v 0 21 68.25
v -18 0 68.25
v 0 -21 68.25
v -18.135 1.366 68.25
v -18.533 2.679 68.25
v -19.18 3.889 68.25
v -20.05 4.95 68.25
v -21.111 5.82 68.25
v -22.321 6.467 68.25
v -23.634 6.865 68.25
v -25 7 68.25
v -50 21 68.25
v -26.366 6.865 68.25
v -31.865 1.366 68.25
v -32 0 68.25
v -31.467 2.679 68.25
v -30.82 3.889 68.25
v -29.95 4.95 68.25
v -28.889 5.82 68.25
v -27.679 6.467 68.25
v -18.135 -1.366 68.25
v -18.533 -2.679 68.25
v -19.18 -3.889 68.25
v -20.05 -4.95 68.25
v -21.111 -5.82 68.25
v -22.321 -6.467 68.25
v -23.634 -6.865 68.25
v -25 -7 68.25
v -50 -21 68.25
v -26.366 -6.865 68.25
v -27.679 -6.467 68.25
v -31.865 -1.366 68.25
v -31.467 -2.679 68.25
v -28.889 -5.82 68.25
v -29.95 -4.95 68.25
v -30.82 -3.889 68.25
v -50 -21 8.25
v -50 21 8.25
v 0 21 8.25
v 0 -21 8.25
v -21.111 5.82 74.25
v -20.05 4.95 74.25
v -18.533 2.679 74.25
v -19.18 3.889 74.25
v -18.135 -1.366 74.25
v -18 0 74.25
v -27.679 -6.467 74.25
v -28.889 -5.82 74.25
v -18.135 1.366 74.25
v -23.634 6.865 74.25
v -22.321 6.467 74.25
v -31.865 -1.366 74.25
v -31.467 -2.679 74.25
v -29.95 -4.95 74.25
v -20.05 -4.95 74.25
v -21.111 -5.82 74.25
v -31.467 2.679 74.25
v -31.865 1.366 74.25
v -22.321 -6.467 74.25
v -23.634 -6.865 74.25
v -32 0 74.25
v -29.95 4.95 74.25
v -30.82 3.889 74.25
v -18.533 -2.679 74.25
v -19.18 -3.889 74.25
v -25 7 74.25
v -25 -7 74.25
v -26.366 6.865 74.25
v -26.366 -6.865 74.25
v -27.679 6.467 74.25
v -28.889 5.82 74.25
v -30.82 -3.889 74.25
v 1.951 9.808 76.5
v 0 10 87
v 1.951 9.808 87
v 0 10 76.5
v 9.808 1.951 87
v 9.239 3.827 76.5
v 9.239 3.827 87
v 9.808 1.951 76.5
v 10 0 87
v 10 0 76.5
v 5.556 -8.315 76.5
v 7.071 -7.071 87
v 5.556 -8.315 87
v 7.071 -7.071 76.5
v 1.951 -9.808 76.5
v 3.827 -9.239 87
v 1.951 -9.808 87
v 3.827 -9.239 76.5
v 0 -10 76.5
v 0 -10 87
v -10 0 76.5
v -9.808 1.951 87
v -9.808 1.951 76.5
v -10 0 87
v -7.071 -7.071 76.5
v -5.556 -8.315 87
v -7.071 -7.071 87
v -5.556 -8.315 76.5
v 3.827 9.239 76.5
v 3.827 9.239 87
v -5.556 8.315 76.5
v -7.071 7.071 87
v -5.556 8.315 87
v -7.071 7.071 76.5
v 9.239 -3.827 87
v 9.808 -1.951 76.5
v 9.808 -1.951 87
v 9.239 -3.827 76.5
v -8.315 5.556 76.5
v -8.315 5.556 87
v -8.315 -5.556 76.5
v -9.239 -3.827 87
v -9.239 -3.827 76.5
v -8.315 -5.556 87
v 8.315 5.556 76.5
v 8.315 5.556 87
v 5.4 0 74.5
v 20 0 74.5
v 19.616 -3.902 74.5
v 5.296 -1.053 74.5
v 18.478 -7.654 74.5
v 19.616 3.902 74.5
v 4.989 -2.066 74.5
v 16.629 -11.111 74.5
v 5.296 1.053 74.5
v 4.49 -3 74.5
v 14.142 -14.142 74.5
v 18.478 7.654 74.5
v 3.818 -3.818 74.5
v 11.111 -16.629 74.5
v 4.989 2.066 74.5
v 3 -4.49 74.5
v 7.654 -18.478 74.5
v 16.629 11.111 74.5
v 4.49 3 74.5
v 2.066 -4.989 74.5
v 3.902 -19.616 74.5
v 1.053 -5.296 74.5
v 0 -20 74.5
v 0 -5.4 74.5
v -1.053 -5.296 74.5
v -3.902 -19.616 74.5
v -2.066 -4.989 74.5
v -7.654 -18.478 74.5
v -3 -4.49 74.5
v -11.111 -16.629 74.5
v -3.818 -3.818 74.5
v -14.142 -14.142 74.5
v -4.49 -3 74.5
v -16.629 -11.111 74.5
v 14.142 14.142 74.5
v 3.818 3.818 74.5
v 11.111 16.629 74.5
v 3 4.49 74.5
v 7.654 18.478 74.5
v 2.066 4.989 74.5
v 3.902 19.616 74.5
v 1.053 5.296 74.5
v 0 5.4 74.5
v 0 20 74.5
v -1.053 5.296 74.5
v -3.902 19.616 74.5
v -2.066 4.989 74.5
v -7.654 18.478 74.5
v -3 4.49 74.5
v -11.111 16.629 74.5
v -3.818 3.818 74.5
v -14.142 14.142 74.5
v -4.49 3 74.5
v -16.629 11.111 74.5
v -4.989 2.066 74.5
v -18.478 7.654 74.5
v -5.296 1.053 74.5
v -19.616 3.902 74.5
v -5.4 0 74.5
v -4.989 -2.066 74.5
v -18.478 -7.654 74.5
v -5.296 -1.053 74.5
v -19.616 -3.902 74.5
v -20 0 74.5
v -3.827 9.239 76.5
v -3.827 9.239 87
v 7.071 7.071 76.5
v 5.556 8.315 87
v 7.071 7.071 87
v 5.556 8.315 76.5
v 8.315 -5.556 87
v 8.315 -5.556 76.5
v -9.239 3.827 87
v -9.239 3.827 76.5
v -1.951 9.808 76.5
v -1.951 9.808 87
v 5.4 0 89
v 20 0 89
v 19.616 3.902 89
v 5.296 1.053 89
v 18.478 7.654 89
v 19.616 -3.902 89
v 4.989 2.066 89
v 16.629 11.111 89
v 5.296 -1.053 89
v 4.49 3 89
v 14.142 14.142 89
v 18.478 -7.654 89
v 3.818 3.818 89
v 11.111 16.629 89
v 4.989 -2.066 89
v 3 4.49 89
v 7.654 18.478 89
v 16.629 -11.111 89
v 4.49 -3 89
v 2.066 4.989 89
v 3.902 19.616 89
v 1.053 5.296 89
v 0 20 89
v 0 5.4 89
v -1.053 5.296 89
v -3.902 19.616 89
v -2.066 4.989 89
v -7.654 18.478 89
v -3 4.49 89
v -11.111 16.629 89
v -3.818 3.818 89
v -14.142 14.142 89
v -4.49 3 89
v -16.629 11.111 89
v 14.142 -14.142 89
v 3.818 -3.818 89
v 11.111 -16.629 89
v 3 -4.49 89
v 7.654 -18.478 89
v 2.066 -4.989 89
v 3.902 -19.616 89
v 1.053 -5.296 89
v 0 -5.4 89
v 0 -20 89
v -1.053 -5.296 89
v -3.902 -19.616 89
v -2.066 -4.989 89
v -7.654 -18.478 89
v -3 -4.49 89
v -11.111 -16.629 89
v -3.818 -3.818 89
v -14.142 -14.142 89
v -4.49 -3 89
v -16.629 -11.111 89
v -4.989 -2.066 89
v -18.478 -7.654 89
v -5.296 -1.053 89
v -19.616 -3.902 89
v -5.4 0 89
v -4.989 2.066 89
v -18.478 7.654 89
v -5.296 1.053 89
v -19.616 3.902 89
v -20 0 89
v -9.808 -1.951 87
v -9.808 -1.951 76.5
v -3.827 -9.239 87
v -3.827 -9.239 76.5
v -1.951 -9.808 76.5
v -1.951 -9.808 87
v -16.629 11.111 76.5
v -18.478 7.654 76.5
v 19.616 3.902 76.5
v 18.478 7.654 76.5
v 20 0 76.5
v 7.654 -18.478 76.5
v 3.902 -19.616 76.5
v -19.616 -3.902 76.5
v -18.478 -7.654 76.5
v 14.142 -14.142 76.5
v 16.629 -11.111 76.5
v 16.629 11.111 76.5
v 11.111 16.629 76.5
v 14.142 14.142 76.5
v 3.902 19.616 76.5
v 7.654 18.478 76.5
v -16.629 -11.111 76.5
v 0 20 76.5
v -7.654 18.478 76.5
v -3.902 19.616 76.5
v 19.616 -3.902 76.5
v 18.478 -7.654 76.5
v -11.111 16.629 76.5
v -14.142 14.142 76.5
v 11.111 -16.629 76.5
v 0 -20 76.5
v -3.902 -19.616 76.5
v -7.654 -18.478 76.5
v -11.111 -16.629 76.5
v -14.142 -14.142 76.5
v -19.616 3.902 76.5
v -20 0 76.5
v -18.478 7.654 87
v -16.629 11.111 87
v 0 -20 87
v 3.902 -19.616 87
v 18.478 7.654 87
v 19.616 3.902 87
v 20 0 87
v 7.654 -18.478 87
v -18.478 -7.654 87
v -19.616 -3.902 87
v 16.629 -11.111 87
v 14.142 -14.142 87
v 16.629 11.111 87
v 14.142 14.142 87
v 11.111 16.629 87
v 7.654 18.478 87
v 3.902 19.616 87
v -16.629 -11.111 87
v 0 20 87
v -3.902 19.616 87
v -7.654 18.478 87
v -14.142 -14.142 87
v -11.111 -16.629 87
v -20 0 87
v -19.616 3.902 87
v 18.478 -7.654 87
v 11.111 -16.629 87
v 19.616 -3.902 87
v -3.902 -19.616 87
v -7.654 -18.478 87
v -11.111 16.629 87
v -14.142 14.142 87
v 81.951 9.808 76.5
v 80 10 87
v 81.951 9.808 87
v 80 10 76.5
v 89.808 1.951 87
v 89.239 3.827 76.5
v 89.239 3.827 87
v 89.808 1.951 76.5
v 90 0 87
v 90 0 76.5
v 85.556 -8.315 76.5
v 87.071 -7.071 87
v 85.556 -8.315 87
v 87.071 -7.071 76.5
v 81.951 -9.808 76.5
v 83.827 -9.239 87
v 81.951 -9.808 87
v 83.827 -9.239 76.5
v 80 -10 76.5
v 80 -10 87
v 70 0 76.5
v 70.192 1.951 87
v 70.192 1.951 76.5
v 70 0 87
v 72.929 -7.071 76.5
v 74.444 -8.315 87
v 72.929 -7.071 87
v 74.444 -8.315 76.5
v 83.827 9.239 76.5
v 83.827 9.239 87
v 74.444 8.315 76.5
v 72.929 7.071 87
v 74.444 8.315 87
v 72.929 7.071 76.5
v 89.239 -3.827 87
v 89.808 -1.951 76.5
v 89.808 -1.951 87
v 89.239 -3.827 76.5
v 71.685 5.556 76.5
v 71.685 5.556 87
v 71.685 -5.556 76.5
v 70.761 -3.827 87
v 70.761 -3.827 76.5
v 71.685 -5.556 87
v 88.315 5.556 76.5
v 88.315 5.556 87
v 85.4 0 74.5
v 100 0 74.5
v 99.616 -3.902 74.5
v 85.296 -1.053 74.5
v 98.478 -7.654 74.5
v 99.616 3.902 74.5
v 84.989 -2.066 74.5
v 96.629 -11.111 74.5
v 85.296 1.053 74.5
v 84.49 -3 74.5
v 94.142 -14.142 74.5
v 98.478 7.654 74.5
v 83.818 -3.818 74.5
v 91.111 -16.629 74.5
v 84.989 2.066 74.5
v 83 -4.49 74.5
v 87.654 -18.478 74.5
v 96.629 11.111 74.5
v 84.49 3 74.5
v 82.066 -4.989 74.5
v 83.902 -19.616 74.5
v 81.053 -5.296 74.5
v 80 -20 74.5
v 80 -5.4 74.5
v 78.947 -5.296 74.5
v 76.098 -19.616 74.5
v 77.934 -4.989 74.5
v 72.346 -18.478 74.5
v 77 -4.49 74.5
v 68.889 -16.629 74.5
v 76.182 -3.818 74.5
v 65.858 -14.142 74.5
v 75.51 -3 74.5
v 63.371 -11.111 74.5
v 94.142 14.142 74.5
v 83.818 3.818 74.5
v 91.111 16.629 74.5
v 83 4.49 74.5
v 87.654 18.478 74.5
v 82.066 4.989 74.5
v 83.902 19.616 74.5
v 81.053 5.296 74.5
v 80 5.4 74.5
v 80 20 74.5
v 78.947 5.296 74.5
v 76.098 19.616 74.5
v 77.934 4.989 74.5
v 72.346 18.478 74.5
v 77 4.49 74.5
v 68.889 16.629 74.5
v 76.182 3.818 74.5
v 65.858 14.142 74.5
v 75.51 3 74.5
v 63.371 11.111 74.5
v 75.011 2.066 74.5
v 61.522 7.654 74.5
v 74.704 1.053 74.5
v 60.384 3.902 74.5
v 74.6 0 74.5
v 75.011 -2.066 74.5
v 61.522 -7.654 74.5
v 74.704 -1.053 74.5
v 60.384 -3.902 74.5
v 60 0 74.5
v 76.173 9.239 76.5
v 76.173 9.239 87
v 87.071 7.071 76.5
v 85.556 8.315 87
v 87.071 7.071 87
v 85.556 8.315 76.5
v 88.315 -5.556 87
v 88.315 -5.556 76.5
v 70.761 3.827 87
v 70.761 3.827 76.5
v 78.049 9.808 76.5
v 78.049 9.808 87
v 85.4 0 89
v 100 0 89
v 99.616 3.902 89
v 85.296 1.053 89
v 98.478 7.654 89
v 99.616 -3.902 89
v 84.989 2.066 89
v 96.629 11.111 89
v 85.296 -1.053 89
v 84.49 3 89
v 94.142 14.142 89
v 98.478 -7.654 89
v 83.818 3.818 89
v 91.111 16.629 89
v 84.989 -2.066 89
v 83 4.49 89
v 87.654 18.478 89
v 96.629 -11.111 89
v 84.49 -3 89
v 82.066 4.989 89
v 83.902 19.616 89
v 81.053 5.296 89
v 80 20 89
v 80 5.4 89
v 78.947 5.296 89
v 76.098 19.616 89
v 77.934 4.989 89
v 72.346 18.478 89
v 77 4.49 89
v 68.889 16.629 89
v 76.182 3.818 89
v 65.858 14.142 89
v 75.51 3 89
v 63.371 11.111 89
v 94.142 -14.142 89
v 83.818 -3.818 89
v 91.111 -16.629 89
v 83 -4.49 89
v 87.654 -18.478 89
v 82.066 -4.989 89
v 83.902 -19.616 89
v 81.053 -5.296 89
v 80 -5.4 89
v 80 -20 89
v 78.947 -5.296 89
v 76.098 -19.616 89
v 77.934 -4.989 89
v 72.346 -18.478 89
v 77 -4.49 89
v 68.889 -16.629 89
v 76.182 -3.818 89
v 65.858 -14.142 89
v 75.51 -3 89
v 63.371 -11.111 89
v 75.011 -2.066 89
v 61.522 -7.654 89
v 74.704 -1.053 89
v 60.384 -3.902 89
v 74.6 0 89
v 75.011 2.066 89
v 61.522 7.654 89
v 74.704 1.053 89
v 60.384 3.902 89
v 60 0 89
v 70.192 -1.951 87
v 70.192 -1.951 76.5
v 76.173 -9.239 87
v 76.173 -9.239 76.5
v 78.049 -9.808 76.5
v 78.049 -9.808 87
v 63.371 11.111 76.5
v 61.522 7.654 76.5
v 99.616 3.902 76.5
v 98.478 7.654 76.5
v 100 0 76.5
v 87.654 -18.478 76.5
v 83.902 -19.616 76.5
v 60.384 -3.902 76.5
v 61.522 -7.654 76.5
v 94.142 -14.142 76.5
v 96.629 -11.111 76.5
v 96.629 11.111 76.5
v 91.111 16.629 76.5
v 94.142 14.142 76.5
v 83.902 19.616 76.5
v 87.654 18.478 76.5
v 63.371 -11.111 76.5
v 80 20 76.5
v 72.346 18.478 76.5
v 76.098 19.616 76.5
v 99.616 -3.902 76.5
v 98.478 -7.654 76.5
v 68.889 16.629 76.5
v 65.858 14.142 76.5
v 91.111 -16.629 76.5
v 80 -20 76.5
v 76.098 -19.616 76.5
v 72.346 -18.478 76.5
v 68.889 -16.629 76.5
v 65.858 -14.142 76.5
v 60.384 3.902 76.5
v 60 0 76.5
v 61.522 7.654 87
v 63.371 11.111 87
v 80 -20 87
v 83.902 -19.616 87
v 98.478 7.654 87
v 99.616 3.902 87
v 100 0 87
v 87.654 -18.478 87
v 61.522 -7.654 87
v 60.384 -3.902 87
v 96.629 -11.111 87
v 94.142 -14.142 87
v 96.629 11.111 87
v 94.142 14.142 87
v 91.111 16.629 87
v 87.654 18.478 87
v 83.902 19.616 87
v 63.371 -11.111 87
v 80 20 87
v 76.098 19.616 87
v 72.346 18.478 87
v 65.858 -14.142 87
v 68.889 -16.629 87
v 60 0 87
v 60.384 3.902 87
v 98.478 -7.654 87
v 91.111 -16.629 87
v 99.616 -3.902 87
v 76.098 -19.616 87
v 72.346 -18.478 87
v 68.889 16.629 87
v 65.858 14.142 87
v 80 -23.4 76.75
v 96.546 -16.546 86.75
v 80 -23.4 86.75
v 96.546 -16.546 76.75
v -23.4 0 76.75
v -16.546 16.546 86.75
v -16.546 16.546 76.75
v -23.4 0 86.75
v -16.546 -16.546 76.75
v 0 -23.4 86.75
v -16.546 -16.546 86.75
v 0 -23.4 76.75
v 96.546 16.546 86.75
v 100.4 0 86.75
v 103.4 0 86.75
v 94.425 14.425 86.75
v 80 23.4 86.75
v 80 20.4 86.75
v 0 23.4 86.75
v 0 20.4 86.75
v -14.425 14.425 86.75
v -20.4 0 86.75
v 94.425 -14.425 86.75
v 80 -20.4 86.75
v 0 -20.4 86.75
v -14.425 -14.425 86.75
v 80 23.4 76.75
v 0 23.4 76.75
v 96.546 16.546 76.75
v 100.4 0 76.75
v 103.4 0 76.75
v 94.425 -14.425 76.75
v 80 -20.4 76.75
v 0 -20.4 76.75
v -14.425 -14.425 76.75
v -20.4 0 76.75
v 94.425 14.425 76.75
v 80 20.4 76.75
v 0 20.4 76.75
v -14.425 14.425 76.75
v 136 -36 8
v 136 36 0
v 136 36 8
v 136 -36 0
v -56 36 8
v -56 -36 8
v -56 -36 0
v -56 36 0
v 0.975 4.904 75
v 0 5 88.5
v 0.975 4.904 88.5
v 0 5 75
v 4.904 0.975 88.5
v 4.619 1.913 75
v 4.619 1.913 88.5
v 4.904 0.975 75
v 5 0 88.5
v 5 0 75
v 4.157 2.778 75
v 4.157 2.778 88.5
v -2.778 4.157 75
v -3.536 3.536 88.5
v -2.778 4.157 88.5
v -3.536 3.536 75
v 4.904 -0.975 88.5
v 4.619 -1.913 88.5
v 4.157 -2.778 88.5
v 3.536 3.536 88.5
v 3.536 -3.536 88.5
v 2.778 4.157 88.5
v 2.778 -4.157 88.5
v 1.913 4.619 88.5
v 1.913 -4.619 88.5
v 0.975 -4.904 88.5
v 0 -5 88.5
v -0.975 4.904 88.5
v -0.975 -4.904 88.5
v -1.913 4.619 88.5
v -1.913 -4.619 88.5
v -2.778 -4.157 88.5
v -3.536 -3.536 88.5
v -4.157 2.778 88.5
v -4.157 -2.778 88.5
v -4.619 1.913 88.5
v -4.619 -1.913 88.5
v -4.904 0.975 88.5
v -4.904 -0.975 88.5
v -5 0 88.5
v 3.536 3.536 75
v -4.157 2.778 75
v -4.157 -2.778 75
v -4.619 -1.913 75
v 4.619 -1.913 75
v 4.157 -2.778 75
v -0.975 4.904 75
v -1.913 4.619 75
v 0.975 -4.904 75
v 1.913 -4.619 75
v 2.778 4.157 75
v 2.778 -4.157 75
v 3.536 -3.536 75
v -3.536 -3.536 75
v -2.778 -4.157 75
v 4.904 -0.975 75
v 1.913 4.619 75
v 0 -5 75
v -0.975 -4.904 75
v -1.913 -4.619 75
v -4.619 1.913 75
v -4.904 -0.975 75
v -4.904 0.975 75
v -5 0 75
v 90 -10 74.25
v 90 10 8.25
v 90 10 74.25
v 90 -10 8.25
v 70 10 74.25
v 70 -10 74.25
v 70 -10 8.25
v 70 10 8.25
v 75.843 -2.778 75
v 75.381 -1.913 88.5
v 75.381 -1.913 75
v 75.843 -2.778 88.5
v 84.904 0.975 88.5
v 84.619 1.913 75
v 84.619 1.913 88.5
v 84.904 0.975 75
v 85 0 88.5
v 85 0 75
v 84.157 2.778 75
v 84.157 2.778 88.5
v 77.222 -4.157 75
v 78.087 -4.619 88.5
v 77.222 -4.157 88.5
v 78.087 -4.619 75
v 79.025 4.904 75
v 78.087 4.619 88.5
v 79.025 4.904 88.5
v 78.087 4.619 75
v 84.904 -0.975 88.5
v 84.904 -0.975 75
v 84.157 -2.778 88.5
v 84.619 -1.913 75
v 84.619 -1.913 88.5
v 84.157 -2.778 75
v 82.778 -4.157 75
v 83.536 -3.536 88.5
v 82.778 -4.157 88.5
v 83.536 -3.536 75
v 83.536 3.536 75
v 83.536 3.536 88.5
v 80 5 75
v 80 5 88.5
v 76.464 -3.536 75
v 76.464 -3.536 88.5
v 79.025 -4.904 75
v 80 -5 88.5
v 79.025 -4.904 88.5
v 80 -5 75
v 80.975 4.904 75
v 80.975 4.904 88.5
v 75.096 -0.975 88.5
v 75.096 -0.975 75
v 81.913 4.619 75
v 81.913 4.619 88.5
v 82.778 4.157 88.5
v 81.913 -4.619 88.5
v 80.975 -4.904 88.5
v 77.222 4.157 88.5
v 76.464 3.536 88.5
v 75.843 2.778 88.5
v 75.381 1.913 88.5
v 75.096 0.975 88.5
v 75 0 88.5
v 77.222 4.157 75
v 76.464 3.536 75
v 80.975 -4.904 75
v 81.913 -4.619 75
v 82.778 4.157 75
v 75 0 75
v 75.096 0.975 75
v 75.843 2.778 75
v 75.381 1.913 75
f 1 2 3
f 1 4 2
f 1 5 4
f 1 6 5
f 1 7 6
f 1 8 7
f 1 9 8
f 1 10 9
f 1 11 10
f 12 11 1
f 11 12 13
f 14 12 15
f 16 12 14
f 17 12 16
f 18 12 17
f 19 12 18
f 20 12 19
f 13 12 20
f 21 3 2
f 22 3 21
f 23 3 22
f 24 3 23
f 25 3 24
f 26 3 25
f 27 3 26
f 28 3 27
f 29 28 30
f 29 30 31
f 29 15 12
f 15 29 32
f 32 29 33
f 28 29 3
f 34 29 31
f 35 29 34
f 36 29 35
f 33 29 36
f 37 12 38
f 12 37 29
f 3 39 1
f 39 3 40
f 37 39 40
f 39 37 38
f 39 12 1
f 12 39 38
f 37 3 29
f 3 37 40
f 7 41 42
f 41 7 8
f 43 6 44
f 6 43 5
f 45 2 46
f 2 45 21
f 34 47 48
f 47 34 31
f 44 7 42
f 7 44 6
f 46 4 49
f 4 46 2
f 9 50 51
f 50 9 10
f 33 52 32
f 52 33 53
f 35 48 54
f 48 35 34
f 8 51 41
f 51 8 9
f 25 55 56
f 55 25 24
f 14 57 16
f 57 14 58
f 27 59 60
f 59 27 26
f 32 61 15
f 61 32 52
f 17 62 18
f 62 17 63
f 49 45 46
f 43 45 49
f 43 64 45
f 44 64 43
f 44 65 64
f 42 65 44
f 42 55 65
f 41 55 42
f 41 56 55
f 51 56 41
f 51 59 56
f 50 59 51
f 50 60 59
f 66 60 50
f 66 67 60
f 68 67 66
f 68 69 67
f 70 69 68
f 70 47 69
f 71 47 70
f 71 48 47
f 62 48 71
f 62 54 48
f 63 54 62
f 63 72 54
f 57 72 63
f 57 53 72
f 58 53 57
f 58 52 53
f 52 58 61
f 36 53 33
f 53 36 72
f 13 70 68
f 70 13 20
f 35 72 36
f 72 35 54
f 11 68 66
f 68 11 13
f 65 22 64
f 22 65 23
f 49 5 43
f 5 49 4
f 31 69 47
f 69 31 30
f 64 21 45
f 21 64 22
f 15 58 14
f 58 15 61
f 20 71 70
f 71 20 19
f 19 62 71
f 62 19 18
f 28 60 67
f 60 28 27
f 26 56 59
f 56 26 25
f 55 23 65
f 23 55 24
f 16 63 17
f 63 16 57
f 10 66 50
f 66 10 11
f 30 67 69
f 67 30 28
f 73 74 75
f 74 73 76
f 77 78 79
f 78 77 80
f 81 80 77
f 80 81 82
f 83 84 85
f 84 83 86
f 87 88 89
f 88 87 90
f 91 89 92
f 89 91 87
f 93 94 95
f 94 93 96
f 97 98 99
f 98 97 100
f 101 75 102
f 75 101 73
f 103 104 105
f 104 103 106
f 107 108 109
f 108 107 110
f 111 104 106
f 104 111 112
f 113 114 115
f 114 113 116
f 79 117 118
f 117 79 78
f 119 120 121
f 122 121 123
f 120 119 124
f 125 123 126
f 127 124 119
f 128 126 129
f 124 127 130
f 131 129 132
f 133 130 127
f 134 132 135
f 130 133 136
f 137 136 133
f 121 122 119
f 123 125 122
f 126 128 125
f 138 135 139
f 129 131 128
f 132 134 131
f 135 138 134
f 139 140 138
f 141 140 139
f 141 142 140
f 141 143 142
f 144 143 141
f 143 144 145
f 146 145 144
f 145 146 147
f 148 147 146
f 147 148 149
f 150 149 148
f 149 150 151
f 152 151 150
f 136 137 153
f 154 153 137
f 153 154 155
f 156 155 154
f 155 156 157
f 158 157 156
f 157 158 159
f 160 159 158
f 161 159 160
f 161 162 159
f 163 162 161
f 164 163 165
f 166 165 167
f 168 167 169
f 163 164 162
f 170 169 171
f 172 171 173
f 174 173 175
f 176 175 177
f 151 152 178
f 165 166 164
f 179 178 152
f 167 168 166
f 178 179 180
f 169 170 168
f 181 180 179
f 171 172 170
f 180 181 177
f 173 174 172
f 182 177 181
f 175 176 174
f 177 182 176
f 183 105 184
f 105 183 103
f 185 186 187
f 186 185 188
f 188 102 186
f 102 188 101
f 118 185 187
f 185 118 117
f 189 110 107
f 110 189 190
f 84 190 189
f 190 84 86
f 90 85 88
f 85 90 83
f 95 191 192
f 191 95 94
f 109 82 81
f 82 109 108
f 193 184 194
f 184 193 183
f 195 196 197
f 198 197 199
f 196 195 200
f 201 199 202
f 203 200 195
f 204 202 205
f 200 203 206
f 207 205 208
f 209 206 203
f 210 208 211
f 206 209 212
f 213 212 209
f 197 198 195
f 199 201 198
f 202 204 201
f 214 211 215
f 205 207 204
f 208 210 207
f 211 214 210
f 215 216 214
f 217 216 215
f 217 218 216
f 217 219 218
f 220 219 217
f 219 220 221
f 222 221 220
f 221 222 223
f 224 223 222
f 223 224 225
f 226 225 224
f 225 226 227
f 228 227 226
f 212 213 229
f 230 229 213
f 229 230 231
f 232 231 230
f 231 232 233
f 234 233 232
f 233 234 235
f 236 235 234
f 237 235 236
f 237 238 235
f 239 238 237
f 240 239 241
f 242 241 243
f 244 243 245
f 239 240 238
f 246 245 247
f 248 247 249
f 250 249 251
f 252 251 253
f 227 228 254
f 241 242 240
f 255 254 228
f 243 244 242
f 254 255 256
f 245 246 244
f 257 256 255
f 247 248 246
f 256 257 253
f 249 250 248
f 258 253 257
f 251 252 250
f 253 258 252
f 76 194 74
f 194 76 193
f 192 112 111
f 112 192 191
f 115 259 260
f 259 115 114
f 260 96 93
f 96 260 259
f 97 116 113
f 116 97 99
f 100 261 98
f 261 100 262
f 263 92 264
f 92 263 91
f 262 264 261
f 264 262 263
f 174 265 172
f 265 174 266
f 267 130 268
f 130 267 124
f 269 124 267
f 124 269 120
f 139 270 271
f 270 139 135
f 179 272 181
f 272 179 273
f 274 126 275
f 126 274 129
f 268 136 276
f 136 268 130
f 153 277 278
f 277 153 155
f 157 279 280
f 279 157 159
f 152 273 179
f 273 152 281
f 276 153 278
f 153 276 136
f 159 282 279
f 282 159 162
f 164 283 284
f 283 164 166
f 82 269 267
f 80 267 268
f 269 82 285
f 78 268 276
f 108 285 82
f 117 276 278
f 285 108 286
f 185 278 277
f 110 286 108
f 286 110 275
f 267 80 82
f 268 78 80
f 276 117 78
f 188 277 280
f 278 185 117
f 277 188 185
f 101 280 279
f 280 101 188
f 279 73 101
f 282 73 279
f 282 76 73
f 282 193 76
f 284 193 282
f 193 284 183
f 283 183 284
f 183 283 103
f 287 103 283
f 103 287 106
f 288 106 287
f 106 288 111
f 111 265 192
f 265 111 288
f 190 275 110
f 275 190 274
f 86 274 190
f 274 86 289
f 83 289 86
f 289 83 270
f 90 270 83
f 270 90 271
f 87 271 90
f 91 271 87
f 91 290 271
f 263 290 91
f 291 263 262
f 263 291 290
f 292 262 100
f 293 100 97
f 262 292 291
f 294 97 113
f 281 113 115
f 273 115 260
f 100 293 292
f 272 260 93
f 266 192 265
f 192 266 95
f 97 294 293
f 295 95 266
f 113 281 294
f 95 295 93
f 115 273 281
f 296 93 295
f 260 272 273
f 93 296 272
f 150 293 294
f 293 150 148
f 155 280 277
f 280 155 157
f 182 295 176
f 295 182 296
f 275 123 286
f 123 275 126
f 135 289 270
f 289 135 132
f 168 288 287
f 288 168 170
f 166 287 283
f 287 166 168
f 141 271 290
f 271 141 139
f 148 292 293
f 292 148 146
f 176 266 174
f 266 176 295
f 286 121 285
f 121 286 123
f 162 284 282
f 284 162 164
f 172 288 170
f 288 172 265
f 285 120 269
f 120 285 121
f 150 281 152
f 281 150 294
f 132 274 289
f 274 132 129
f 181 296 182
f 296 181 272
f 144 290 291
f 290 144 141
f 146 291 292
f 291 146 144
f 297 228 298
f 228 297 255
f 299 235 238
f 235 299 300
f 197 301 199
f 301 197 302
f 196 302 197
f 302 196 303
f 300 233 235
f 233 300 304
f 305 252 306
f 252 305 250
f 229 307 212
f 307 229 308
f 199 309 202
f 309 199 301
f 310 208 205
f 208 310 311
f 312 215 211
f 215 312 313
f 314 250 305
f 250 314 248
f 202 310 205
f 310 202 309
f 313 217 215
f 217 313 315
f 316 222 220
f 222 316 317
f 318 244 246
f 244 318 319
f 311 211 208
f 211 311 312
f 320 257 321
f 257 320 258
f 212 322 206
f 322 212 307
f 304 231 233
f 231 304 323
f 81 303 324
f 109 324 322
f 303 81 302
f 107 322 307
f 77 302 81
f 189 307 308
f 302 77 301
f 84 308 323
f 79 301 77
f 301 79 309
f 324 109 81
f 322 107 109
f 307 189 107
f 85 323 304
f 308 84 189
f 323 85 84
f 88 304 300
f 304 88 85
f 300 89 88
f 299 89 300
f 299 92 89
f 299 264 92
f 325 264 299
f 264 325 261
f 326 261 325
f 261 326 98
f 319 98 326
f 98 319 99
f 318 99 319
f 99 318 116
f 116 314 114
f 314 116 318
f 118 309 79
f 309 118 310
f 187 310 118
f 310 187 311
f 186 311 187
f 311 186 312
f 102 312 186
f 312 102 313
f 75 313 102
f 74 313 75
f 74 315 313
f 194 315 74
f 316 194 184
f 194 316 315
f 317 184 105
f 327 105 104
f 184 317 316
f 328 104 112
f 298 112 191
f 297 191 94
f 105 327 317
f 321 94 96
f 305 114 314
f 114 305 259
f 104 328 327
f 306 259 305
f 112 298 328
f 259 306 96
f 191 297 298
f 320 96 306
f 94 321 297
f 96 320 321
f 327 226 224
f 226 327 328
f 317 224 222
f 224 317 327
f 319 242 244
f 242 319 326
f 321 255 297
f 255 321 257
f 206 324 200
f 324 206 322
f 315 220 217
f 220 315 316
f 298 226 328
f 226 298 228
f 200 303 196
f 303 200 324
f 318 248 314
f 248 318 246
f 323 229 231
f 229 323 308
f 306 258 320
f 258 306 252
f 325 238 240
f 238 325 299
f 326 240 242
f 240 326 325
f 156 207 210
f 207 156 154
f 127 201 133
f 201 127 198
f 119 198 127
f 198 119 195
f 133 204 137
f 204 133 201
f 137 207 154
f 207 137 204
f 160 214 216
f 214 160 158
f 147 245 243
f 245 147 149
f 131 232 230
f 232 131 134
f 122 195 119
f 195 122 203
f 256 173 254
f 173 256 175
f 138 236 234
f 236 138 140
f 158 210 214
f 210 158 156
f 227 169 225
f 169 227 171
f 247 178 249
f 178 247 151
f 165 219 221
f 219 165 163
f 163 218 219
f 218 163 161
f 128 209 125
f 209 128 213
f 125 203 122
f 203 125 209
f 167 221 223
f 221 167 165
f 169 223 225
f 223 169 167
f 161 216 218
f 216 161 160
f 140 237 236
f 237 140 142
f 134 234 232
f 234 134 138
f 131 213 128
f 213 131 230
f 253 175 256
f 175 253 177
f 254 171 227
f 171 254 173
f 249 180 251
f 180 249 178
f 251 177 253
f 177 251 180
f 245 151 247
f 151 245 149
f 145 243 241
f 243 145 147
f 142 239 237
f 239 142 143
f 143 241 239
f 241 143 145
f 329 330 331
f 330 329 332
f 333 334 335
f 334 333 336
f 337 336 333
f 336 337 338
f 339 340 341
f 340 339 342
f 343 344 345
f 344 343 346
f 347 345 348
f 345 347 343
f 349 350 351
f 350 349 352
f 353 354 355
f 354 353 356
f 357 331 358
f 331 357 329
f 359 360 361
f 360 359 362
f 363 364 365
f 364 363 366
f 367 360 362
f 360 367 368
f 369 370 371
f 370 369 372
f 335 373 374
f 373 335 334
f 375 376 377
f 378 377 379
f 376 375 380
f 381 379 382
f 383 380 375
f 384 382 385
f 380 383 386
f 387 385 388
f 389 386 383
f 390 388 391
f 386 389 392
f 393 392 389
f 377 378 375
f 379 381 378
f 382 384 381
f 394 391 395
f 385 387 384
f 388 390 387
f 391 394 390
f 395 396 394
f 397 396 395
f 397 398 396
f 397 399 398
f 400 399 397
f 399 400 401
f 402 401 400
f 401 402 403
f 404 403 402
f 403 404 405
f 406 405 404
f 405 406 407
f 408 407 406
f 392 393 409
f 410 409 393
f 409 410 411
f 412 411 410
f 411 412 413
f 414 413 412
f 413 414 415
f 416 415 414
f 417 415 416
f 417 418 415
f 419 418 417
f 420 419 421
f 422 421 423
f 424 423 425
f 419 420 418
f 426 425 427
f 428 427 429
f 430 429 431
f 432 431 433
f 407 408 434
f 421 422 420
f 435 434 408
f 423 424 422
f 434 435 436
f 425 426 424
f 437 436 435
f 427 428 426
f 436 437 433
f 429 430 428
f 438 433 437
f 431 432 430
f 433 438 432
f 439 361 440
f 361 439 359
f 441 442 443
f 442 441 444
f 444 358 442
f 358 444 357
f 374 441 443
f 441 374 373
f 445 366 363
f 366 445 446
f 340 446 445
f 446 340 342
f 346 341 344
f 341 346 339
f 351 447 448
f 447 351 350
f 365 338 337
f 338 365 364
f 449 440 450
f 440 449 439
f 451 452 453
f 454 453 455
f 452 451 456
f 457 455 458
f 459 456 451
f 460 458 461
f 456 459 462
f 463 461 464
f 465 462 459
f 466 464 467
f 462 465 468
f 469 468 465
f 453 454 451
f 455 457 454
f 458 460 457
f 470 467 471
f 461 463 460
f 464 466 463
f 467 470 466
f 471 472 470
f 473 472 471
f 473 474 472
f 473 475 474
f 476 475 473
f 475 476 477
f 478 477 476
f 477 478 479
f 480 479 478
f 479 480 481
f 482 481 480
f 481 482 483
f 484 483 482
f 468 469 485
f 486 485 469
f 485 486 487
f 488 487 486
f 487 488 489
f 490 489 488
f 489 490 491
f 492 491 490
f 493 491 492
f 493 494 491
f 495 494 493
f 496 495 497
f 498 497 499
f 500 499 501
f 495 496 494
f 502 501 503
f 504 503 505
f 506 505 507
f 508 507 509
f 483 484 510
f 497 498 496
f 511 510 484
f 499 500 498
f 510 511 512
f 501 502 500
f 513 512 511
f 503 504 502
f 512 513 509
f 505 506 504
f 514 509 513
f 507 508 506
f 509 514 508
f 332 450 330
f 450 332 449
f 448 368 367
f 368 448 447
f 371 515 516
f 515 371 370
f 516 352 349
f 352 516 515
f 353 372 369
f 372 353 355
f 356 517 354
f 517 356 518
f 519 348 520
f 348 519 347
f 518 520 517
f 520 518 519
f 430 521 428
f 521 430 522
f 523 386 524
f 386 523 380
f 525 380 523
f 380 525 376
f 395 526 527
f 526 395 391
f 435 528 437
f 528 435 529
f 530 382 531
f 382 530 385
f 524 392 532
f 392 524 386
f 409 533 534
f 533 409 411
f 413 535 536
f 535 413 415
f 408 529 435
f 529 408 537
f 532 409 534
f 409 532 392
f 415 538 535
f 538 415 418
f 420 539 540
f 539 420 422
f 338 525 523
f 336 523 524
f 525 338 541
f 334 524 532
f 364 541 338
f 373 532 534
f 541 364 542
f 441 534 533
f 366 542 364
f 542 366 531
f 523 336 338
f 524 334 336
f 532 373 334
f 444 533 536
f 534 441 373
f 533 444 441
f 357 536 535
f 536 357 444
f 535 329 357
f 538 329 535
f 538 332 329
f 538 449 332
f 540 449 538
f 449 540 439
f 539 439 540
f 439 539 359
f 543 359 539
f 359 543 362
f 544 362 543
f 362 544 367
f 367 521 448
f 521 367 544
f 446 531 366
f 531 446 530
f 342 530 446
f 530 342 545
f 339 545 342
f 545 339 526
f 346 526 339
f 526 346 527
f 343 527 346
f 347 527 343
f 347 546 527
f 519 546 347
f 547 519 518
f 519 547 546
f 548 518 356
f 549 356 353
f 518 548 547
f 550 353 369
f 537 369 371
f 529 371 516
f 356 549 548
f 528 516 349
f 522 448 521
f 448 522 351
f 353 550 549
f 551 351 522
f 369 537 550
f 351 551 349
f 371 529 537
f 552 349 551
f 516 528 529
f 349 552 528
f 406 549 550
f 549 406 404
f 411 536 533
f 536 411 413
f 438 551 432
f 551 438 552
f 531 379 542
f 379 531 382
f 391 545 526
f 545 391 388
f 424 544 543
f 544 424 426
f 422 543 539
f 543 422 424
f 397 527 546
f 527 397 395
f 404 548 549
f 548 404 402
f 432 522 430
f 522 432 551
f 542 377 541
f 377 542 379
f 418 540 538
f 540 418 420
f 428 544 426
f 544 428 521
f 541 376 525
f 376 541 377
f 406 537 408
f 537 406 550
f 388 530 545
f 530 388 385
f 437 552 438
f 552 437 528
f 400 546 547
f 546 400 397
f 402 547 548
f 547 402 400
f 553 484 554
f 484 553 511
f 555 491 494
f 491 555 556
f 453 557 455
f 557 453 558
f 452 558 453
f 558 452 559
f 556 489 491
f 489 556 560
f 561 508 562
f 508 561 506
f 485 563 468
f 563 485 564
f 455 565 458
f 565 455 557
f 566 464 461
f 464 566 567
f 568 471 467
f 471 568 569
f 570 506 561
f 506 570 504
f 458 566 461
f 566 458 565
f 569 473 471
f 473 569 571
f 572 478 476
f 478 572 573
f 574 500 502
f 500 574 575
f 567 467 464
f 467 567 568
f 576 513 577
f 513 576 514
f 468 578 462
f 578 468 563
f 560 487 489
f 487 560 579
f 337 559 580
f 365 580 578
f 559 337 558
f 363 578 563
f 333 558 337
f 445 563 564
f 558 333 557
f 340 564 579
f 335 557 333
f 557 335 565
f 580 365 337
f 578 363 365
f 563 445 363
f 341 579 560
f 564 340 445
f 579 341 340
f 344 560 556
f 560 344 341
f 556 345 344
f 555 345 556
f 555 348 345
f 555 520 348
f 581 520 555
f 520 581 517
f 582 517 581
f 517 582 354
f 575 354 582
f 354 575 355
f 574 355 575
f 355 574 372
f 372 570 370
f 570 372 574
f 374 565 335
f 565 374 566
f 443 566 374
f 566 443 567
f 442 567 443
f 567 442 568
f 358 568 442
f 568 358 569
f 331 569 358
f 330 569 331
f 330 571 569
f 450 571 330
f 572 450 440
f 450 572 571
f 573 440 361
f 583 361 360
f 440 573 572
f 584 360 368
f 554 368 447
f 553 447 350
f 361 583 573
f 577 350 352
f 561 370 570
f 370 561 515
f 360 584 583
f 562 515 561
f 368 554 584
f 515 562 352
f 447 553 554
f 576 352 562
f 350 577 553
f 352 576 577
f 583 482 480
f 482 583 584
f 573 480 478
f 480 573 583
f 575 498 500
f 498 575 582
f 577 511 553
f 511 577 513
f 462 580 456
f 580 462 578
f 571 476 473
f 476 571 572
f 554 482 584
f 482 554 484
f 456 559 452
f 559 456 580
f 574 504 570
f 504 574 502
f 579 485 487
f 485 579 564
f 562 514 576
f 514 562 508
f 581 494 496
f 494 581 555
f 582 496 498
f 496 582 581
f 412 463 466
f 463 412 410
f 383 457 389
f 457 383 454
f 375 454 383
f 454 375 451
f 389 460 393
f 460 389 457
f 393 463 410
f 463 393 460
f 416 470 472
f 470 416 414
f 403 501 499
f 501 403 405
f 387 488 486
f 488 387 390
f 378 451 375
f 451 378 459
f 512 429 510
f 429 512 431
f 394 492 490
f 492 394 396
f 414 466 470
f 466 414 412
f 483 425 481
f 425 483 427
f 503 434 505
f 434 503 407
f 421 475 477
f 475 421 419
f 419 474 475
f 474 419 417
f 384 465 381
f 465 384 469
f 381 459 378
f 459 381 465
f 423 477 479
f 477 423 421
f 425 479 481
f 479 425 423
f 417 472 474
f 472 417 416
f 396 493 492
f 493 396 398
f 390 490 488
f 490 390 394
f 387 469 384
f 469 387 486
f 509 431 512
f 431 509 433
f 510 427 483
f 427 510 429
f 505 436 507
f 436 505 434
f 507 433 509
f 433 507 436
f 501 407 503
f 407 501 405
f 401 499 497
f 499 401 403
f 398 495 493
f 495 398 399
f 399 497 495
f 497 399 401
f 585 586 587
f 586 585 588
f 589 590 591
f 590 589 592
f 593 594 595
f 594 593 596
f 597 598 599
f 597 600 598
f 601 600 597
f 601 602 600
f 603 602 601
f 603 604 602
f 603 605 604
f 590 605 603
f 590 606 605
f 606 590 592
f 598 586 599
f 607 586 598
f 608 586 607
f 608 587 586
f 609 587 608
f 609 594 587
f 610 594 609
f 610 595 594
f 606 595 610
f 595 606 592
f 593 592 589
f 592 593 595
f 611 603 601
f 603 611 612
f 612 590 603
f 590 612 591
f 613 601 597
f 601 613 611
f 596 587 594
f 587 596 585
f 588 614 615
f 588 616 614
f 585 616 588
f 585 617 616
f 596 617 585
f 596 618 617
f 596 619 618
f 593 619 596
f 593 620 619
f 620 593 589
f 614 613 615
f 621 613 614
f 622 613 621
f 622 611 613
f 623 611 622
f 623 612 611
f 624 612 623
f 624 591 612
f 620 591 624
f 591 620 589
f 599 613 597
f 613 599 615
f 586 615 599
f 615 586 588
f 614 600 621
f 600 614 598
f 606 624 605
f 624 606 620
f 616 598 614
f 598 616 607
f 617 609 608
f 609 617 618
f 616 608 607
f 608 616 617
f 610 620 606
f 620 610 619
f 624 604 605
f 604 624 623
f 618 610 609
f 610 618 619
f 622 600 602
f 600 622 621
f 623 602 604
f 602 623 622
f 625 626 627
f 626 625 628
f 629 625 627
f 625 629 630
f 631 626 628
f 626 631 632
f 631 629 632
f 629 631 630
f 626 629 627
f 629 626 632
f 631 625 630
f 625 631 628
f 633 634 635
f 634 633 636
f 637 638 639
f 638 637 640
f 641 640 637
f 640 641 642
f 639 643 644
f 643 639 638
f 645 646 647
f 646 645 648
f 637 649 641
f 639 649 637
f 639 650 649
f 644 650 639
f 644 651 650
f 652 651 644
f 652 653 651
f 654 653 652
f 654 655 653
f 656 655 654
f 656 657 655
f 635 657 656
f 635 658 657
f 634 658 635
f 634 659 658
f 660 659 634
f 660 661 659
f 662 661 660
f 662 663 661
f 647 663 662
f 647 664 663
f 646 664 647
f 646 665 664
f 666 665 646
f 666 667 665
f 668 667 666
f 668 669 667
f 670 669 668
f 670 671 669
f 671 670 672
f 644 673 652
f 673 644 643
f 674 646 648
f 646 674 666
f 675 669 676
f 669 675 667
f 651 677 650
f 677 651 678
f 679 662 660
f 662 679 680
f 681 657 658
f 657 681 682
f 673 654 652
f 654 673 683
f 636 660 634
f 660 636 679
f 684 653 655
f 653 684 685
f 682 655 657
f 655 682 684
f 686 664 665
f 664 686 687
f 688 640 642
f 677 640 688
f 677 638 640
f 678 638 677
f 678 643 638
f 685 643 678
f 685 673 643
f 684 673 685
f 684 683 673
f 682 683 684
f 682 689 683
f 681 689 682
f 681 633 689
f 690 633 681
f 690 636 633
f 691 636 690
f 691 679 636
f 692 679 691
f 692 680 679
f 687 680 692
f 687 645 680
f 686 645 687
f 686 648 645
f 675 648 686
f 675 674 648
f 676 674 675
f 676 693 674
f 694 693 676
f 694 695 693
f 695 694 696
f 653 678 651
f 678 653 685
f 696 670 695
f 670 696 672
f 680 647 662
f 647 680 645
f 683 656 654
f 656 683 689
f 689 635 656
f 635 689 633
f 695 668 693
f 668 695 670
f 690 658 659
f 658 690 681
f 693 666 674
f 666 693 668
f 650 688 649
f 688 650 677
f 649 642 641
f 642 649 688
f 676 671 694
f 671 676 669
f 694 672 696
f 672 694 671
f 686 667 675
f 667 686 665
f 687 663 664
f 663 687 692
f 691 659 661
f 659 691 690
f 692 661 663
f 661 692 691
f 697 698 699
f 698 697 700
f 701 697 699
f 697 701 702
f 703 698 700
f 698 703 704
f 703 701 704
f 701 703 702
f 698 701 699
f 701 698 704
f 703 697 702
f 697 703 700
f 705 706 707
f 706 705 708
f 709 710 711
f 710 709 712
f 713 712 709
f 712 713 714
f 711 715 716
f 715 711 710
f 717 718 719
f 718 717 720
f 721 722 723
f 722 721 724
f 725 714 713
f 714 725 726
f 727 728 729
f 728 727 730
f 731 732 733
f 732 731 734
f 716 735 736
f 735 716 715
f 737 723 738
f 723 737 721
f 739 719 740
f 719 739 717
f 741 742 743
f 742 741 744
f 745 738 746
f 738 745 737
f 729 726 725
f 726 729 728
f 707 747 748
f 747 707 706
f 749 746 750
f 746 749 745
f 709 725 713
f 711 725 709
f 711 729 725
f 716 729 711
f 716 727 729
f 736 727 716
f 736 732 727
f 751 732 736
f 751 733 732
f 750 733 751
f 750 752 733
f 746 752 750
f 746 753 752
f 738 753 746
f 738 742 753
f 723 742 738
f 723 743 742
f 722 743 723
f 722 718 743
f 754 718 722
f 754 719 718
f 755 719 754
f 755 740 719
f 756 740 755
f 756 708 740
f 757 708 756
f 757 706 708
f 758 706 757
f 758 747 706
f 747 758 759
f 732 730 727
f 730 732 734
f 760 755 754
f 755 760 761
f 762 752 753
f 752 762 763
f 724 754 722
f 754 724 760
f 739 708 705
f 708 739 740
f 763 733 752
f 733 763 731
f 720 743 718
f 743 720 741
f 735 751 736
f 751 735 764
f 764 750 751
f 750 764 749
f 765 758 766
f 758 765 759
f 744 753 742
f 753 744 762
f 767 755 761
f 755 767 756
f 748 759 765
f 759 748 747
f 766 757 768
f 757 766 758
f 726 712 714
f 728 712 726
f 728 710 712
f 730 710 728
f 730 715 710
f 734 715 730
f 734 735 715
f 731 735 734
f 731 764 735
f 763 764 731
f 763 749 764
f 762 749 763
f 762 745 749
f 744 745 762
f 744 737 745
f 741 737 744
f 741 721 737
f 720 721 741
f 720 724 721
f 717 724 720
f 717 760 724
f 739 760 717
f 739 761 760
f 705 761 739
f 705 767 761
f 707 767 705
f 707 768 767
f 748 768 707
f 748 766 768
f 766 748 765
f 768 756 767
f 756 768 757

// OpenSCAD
$fn = 32;

// ------------------------------------------------------------------------
// Motor belt drive: span 80 mm, pulleys d40, belt 10 mm wide
// Every part is its own module, assembly() places every instance.
// ------------------------------------------------------------------------

// --- part 1 ---
module base_plate() {
  difference() {
    translate([-96, -36, 0]) cube([192, 72, 8]);
  }
}

// --- part 2 ---
module motor() {
  union() {
    translate([-30, -21, 0]) cube([60, 42, 50]);
    translate([33, 0, 25]) rotate([0, 90, 0]) cylinder(h = 6, d = 14, center = true);
  }
}

// --- part 3 ---
module drive_shaft() {
  translate([0, 0, -6.75]) cylinder(h = 13.5, d = 10);
}

// --- part 4 ---
module pulley_drive() {
  difference() {
    union() {
      cylinder(h = 14.5, d = 20);
      cylinder(h = 2, d = 40);
      translate([0, 0, 12.5]) cylinder(h = 2, d = 40);
    }
    translate([0, 0, -1]) cylinder(h = 16.5, d = 10.8);
  }
}

// --- part 5 ---
module idler_post() {
  translate([-10, -10, 0]) cube([20, 20, 66]);
}

// --- part 6 ---
module driven_shaft() {
  translate([0, 0, -6.75]) cylinder(h = 13.5, d = 10);
}

// --- part 7 ---
module pulley_driven() {
  difference() {
    union() {
      cylinder(h = 14.5, d = 20);
      cylinder(h = 2, d = 40);
      translate([0, 0, 12.5]) cylinder(h = 2, d = 40);
    }
    translate([0, 0, -1]) cylinder(h = 16.5, d = 10.8);
  }
}

// --- part 8 ---
module drive_belt() {
  difference() {
    linear_extrude(height = 10) polygon(points = concat([for (a = [90 : 45 : 270]) [23.4 * cos(a), 23.4 * sin(a)]], [for (a = [270 : 45 : 450]) [80 + 23.4 * cos(a), 23.4 * sin(a)]]));
    translate([0, 0, -1]) linear_extrude(height = 12) polygon(points = concat([for (a = [90 : 45 : 270]) [20.4 * cos(a), 20.4 * sin(a)]], [for (a = [270 : 45 : 450]) [80 + 20.4 * cos(a), 20.4 * sin(a)]]));
  }
}

// --- assembly ---
module assembly() {
  color([0.80, 0.24, 0.20]) translate([40, 0, 0]) rotate([0, 0, 0]) base_plate();
  color([0.20, 0.45, 0.75]) translate([0, 0, 38.25]) rotate([0, 270, 0]) motor();
  color([0.25, 0.62, 0.32]) translate([0, 0, 81.75]) rotate([0, 0, 0]) drive_shaft();
  color([0.92, 0.70, 0.18]) translate([0, 0, 74.5]) rotate([0, 0, 0]) pulley_drive();
  color([0.58, 0.35, 0.70]) translate([80, 0, 8.25]) rotate([0, 0, 0]) idler_post();
  color([0.16, 0.66, 0.66]) translate([80, 0, 81.75]) rotate([0, 0, 0]) driven_shaft();
  color([0.85, 0.48, 0.18]) translate([80, 0, 74.5]) rotate([0, 0, 0]) pulley_driven();
  color([0.55, 0.60, 0.65]) translate([0, 0, 76.75]) rotate([0, 0, 0]) drive_belt();
}

assembly();
